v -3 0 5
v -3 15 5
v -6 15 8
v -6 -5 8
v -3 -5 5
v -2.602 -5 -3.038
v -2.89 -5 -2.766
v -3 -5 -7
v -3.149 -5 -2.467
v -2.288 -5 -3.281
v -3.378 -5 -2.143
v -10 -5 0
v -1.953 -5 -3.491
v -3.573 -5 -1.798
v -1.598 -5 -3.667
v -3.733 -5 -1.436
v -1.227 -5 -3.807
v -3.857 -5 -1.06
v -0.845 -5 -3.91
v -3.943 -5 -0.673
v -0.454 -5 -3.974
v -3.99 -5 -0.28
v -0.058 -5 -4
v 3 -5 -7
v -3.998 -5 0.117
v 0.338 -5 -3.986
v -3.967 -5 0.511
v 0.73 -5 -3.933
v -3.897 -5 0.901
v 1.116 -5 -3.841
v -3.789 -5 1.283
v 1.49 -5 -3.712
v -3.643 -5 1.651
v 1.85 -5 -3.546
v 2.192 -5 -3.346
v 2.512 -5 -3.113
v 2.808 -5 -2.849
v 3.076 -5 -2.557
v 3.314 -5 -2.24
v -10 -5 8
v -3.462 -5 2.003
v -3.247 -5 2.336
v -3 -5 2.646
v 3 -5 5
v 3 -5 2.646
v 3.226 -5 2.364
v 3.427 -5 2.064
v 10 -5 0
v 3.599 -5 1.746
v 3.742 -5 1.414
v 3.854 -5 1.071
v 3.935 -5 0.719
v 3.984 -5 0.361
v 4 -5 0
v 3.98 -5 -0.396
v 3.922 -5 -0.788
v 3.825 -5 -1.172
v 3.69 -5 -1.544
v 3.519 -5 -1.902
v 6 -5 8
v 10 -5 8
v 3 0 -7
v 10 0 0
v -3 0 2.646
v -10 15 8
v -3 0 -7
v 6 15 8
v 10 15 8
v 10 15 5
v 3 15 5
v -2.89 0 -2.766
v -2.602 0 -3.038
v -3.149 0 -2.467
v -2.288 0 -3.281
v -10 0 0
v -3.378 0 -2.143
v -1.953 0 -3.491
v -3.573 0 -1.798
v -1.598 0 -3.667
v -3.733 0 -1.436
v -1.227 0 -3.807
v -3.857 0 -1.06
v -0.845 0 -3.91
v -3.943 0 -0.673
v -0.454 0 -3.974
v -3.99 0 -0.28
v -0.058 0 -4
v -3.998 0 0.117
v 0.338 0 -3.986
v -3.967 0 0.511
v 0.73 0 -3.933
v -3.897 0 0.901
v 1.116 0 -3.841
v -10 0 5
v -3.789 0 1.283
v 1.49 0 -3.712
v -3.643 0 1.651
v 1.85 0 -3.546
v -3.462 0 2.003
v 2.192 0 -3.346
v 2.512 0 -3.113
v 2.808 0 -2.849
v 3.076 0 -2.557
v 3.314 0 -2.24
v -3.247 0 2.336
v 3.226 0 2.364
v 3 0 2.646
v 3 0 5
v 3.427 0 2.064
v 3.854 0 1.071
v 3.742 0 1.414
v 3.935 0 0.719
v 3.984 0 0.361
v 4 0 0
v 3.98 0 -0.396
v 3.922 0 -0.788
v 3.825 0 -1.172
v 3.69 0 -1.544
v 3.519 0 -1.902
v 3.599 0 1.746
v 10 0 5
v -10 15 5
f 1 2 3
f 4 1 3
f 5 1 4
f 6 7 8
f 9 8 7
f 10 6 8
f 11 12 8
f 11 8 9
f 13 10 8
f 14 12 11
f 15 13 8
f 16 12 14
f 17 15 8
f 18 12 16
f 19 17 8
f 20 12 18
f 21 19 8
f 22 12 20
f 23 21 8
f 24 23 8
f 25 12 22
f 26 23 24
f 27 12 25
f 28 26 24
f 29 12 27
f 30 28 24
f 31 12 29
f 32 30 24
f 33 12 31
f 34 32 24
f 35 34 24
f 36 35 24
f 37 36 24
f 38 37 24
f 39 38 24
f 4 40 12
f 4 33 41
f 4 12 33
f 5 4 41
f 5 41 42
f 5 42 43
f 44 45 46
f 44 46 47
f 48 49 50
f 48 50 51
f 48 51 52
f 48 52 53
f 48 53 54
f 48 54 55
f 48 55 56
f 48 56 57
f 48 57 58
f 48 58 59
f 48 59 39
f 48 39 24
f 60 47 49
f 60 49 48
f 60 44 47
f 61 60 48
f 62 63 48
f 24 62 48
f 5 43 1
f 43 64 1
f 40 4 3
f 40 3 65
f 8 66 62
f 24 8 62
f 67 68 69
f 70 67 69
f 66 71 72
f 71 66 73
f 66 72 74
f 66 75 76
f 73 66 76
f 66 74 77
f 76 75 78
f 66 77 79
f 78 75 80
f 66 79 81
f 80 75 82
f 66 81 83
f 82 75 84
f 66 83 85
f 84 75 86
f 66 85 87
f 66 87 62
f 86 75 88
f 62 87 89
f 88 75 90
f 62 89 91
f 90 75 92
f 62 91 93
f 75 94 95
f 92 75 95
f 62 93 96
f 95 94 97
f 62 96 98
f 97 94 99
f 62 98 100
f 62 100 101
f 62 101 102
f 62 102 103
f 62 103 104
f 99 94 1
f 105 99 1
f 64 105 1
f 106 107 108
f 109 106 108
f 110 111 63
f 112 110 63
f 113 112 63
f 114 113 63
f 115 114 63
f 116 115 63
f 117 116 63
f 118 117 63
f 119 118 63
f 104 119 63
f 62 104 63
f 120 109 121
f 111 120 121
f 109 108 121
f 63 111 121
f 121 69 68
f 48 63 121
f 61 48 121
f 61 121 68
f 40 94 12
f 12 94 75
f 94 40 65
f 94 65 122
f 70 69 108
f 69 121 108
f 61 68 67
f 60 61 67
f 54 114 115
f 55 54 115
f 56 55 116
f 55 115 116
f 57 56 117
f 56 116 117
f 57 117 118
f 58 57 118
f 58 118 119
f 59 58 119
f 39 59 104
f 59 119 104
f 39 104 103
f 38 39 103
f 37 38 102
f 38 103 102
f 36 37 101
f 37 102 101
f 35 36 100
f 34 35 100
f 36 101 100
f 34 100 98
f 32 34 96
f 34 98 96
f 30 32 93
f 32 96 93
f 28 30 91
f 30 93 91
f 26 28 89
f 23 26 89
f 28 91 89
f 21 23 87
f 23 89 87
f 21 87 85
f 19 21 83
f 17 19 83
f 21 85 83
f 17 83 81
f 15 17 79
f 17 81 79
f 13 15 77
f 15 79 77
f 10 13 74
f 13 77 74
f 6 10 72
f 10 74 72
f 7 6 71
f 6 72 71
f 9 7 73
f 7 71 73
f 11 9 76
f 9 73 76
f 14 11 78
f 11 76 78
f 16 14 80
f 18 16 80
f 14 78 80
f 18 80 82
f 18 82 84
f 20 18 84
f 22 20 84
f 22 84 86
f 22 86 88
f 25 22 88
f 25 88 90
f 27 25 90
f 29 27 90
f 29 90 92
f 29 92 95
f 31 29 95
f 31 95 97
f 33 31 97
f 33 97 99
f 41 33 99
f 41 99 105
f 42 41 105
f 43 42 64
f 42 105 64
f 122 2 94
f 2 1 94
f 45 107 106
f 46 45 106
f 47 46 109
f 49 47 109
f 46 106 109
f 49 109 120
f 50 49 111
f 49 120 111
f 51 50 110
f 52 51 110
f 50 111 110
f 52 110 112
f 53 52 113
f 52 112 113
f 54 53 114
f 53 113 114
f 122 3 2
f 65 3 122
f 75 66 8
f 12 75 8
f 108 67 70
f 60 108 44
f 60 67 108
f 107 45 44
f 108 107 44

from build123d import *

# Parameters (mm, degrees)
F1_DEPTH = 5
F2_SIZE  = 7
F3_W     = 7
F3_H     = 3
F4_DEPTH = 15
F5_SIZE  = 3


with BuildPart() as f1:
    # F0 (on Front) → F1 (new body)
    with BuildSketch(Plane.XZ):
        with BuildLine():
            ThreePointArc((3, 2.645751), (3.741657, 1.414214), (4, 0))
            ThreePointArc((4, 0), (-1.414214, -3.741657), (-3, 2.645751))
            Line((-3, 2.645751), (-3, 8))
            Line((-3, 8), (-10, 8))
            Line((-10, 8), (-10, -7))
            Line((-10, -7), (0, -7))
            Line((0, -7), (10, -7))
            Line((10, -7), (10, 8))
            Line((10, 8), (3, 8))
            Line((3, 8), (3, 2.645751))
        make_face()
    extrude(amount=F1_DEPTH)

    # F2
    f2_edges = [f1.edges().sort_by_distance(p)[0] for p in [
        (-10, -2.5, -7),
        (10, -2.5, -7),
    ]]
    chamfer(f2_edges, length=F2_SIZE)

    # F3 (on face) → F4 (join)
    with BuildSketch(Plane(origin=(0, 0, 0), x_dir=(-1, 0, 0), z_dir=(0, 1, 0))):
        with Locations((-6.5, 6.5)):
            Rectangle(F3_W, F3_H)
        with Locations((6.5, 6.5)):
            Rectangle(F3_W, F3_H)
    extrude(amount=F4_DEPTH)

    # F5
    f5_edges = [f1.edges().sort_by_distance(p)[0] for p in [
        (-3, 5, 8),
        (3, 5, 8),
    ]]
    chamfer(f5_edges, length=F5_SIZE)


solid = f1.part
